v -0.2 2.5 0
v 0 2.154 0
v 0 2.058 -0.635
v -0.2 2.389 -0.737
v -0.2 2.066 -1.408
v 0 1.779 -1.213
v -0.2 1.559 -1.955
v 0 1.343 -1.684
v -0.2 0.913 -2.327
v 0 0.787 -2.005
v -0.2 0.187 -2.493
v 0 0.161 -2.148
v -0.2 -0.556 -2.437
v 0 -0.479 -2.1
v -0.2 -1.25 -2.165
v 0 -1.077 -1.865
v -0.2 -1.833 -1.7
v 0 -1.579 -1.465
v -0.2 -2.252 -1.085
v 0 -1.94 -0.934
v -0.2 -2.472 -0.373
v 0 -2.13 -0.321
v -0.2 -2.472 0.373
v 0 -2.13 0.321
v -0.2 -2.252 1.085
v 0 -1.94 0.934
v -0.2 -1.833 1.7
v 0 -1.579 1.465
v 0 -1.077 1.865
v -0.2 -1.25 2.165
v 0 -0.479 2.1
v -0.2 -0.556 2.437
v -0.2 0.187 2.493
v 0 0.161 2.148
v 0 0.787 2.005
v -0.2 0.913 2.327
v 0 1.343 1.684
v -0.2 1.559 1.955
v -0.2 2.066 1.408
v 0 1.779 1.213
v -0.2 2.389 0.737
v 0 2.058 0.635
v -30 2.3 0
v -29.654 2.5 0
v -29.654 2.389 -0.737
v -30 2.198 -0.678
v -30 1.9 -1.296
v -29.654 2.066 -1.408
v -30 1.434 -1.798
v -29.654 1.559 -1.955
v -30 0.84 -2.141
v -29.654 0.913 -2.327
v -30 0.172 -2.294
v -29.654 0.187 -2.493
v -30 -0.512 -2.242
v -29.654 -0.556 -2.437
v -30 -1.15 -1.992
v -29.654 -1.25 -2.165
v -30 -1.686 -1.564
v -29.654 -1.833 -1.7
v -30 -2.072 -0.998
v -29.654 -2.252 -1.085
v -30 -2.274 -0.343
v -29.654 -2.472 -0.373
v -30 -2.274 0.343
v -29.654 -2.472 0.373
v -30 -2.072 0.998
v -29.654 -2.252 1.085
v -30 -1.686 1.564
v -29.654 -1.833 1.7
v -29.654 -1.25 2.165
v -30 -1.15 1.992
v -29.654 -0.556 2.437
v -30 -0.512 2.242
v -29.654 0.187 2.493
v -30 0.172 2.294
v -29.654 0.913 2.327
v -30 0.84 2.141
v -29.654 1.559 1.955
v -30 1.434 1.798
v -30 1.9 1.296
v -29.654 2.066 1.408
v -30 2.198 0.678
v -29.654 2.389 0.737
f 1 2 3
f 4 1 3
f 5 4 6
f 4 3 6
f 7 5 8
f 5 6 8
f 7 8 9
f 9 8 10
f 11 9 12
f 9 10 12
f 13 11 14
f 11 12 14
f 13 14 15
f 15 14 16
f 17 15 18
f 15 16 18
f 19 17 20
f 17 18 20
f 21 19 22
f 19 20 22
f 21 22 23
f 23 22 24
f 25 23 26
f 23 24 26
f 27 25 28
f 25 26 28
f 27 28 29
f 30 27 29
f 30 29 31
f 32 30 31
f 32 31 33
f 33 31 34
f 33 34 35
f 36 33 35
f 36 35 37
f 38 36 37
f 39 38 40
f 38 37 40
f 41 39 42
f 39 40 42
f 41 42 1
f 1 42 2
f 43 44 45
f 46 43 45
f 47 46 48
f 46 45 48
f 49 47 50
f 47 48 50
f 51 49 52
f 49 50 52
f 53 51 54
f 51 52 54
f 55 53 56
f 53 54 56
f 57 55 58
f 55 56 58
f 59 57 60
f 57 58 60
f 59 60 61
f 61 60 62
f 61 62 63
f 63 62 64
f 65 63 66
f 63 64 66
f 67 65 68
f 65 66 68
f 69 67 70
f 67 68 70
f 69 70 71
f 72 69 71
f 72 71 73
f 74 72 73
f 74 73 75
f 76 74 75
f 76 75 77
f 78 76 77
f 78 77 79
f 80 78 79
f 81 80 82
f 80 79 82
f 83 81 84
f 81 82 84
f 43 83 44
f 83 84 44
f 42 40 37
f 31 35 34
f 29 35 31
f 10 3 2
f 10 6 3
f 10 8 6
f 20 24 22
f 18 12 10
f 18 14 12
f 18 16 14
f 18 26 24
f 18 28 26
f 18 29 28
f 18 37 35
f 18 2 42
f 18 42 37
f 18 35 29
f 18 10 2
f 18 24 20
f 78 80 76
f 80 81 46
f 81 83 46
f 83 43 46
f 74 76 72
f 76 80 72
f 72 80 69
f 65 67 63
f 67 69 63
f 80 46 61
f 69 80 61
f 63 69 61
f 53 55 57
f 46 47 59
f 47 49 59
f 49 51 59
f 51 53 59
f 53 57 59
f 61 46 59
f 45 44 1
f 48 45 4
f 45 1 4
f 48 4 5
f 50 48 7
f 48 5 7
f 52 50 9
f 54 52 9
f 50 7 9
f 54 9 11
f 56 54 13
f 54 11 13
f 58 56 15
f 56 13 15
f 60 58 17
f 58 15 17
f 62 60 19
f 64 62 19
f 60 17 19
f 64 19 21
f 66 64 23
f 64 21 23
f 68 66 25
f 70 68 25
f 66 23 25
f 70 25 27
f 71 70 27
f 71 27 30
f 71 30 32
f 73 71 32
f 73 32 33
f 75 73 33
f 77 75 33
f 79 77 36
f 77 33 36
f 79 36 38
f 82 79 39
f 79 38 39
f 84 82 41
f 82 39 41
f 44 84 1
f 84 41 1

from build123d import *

# Parameters (mm, degrees)
SKETCH1_W             = 30
SKETCH1_H             = 2.5
CHAMFER1_SIZE         = 0.2
CHAMFER1_SIZE2        = 0.346410162
CHAMFER1_PART_2_SIZE  = 0.2
CHAMFER1_PART_2_SIZE2 = 0.346410162


with BuildPart() as part:
    # Sketch1 → Revolve1 (revolve)
    with BuildSketch(Plane.XY):
        with Locations((-15, 1.25)):
            Rectangle(SKETCH1_W, SKETCH1_H)
    revolve(axis=Axis((0, 0, 0), (-1, 0, 0)))

    # Chamfer1
    chamfer1_edges = [part.edges().sort_by_distance(p)[0] for p in [
        (-30, -2.5, 0),
    ]]
    chamfer1_side = [part.faces().sort_by_distance(p)[0] for p in [
        (-30, 0, 0),
    ]]
    chamfer(chamfer1_edges, length=CHAMFER1_SIZE, length2=CHAMFER1_SIZE2, reference=chamfer1_side[0])

    # Chamfer1 part 2
    chamfer1_part_2_edges = [part.edges().sort_by_distance(p)[0] for p in [
        (0, -2.5, 0),
    ]]
    chamfer1_part_2_side = [part.faces().sort_by_distance(p)[0] for p in [
        (-15, -2.5, 0),
    ]]
    chamfer(chamfer1_part_2_edges, length=CHAMFER1_PART_2_SIZE, length2=CHAMFER1_PART_2_SIZE2, reference=chamfer1_part_2_side[0])


solid = part.part
